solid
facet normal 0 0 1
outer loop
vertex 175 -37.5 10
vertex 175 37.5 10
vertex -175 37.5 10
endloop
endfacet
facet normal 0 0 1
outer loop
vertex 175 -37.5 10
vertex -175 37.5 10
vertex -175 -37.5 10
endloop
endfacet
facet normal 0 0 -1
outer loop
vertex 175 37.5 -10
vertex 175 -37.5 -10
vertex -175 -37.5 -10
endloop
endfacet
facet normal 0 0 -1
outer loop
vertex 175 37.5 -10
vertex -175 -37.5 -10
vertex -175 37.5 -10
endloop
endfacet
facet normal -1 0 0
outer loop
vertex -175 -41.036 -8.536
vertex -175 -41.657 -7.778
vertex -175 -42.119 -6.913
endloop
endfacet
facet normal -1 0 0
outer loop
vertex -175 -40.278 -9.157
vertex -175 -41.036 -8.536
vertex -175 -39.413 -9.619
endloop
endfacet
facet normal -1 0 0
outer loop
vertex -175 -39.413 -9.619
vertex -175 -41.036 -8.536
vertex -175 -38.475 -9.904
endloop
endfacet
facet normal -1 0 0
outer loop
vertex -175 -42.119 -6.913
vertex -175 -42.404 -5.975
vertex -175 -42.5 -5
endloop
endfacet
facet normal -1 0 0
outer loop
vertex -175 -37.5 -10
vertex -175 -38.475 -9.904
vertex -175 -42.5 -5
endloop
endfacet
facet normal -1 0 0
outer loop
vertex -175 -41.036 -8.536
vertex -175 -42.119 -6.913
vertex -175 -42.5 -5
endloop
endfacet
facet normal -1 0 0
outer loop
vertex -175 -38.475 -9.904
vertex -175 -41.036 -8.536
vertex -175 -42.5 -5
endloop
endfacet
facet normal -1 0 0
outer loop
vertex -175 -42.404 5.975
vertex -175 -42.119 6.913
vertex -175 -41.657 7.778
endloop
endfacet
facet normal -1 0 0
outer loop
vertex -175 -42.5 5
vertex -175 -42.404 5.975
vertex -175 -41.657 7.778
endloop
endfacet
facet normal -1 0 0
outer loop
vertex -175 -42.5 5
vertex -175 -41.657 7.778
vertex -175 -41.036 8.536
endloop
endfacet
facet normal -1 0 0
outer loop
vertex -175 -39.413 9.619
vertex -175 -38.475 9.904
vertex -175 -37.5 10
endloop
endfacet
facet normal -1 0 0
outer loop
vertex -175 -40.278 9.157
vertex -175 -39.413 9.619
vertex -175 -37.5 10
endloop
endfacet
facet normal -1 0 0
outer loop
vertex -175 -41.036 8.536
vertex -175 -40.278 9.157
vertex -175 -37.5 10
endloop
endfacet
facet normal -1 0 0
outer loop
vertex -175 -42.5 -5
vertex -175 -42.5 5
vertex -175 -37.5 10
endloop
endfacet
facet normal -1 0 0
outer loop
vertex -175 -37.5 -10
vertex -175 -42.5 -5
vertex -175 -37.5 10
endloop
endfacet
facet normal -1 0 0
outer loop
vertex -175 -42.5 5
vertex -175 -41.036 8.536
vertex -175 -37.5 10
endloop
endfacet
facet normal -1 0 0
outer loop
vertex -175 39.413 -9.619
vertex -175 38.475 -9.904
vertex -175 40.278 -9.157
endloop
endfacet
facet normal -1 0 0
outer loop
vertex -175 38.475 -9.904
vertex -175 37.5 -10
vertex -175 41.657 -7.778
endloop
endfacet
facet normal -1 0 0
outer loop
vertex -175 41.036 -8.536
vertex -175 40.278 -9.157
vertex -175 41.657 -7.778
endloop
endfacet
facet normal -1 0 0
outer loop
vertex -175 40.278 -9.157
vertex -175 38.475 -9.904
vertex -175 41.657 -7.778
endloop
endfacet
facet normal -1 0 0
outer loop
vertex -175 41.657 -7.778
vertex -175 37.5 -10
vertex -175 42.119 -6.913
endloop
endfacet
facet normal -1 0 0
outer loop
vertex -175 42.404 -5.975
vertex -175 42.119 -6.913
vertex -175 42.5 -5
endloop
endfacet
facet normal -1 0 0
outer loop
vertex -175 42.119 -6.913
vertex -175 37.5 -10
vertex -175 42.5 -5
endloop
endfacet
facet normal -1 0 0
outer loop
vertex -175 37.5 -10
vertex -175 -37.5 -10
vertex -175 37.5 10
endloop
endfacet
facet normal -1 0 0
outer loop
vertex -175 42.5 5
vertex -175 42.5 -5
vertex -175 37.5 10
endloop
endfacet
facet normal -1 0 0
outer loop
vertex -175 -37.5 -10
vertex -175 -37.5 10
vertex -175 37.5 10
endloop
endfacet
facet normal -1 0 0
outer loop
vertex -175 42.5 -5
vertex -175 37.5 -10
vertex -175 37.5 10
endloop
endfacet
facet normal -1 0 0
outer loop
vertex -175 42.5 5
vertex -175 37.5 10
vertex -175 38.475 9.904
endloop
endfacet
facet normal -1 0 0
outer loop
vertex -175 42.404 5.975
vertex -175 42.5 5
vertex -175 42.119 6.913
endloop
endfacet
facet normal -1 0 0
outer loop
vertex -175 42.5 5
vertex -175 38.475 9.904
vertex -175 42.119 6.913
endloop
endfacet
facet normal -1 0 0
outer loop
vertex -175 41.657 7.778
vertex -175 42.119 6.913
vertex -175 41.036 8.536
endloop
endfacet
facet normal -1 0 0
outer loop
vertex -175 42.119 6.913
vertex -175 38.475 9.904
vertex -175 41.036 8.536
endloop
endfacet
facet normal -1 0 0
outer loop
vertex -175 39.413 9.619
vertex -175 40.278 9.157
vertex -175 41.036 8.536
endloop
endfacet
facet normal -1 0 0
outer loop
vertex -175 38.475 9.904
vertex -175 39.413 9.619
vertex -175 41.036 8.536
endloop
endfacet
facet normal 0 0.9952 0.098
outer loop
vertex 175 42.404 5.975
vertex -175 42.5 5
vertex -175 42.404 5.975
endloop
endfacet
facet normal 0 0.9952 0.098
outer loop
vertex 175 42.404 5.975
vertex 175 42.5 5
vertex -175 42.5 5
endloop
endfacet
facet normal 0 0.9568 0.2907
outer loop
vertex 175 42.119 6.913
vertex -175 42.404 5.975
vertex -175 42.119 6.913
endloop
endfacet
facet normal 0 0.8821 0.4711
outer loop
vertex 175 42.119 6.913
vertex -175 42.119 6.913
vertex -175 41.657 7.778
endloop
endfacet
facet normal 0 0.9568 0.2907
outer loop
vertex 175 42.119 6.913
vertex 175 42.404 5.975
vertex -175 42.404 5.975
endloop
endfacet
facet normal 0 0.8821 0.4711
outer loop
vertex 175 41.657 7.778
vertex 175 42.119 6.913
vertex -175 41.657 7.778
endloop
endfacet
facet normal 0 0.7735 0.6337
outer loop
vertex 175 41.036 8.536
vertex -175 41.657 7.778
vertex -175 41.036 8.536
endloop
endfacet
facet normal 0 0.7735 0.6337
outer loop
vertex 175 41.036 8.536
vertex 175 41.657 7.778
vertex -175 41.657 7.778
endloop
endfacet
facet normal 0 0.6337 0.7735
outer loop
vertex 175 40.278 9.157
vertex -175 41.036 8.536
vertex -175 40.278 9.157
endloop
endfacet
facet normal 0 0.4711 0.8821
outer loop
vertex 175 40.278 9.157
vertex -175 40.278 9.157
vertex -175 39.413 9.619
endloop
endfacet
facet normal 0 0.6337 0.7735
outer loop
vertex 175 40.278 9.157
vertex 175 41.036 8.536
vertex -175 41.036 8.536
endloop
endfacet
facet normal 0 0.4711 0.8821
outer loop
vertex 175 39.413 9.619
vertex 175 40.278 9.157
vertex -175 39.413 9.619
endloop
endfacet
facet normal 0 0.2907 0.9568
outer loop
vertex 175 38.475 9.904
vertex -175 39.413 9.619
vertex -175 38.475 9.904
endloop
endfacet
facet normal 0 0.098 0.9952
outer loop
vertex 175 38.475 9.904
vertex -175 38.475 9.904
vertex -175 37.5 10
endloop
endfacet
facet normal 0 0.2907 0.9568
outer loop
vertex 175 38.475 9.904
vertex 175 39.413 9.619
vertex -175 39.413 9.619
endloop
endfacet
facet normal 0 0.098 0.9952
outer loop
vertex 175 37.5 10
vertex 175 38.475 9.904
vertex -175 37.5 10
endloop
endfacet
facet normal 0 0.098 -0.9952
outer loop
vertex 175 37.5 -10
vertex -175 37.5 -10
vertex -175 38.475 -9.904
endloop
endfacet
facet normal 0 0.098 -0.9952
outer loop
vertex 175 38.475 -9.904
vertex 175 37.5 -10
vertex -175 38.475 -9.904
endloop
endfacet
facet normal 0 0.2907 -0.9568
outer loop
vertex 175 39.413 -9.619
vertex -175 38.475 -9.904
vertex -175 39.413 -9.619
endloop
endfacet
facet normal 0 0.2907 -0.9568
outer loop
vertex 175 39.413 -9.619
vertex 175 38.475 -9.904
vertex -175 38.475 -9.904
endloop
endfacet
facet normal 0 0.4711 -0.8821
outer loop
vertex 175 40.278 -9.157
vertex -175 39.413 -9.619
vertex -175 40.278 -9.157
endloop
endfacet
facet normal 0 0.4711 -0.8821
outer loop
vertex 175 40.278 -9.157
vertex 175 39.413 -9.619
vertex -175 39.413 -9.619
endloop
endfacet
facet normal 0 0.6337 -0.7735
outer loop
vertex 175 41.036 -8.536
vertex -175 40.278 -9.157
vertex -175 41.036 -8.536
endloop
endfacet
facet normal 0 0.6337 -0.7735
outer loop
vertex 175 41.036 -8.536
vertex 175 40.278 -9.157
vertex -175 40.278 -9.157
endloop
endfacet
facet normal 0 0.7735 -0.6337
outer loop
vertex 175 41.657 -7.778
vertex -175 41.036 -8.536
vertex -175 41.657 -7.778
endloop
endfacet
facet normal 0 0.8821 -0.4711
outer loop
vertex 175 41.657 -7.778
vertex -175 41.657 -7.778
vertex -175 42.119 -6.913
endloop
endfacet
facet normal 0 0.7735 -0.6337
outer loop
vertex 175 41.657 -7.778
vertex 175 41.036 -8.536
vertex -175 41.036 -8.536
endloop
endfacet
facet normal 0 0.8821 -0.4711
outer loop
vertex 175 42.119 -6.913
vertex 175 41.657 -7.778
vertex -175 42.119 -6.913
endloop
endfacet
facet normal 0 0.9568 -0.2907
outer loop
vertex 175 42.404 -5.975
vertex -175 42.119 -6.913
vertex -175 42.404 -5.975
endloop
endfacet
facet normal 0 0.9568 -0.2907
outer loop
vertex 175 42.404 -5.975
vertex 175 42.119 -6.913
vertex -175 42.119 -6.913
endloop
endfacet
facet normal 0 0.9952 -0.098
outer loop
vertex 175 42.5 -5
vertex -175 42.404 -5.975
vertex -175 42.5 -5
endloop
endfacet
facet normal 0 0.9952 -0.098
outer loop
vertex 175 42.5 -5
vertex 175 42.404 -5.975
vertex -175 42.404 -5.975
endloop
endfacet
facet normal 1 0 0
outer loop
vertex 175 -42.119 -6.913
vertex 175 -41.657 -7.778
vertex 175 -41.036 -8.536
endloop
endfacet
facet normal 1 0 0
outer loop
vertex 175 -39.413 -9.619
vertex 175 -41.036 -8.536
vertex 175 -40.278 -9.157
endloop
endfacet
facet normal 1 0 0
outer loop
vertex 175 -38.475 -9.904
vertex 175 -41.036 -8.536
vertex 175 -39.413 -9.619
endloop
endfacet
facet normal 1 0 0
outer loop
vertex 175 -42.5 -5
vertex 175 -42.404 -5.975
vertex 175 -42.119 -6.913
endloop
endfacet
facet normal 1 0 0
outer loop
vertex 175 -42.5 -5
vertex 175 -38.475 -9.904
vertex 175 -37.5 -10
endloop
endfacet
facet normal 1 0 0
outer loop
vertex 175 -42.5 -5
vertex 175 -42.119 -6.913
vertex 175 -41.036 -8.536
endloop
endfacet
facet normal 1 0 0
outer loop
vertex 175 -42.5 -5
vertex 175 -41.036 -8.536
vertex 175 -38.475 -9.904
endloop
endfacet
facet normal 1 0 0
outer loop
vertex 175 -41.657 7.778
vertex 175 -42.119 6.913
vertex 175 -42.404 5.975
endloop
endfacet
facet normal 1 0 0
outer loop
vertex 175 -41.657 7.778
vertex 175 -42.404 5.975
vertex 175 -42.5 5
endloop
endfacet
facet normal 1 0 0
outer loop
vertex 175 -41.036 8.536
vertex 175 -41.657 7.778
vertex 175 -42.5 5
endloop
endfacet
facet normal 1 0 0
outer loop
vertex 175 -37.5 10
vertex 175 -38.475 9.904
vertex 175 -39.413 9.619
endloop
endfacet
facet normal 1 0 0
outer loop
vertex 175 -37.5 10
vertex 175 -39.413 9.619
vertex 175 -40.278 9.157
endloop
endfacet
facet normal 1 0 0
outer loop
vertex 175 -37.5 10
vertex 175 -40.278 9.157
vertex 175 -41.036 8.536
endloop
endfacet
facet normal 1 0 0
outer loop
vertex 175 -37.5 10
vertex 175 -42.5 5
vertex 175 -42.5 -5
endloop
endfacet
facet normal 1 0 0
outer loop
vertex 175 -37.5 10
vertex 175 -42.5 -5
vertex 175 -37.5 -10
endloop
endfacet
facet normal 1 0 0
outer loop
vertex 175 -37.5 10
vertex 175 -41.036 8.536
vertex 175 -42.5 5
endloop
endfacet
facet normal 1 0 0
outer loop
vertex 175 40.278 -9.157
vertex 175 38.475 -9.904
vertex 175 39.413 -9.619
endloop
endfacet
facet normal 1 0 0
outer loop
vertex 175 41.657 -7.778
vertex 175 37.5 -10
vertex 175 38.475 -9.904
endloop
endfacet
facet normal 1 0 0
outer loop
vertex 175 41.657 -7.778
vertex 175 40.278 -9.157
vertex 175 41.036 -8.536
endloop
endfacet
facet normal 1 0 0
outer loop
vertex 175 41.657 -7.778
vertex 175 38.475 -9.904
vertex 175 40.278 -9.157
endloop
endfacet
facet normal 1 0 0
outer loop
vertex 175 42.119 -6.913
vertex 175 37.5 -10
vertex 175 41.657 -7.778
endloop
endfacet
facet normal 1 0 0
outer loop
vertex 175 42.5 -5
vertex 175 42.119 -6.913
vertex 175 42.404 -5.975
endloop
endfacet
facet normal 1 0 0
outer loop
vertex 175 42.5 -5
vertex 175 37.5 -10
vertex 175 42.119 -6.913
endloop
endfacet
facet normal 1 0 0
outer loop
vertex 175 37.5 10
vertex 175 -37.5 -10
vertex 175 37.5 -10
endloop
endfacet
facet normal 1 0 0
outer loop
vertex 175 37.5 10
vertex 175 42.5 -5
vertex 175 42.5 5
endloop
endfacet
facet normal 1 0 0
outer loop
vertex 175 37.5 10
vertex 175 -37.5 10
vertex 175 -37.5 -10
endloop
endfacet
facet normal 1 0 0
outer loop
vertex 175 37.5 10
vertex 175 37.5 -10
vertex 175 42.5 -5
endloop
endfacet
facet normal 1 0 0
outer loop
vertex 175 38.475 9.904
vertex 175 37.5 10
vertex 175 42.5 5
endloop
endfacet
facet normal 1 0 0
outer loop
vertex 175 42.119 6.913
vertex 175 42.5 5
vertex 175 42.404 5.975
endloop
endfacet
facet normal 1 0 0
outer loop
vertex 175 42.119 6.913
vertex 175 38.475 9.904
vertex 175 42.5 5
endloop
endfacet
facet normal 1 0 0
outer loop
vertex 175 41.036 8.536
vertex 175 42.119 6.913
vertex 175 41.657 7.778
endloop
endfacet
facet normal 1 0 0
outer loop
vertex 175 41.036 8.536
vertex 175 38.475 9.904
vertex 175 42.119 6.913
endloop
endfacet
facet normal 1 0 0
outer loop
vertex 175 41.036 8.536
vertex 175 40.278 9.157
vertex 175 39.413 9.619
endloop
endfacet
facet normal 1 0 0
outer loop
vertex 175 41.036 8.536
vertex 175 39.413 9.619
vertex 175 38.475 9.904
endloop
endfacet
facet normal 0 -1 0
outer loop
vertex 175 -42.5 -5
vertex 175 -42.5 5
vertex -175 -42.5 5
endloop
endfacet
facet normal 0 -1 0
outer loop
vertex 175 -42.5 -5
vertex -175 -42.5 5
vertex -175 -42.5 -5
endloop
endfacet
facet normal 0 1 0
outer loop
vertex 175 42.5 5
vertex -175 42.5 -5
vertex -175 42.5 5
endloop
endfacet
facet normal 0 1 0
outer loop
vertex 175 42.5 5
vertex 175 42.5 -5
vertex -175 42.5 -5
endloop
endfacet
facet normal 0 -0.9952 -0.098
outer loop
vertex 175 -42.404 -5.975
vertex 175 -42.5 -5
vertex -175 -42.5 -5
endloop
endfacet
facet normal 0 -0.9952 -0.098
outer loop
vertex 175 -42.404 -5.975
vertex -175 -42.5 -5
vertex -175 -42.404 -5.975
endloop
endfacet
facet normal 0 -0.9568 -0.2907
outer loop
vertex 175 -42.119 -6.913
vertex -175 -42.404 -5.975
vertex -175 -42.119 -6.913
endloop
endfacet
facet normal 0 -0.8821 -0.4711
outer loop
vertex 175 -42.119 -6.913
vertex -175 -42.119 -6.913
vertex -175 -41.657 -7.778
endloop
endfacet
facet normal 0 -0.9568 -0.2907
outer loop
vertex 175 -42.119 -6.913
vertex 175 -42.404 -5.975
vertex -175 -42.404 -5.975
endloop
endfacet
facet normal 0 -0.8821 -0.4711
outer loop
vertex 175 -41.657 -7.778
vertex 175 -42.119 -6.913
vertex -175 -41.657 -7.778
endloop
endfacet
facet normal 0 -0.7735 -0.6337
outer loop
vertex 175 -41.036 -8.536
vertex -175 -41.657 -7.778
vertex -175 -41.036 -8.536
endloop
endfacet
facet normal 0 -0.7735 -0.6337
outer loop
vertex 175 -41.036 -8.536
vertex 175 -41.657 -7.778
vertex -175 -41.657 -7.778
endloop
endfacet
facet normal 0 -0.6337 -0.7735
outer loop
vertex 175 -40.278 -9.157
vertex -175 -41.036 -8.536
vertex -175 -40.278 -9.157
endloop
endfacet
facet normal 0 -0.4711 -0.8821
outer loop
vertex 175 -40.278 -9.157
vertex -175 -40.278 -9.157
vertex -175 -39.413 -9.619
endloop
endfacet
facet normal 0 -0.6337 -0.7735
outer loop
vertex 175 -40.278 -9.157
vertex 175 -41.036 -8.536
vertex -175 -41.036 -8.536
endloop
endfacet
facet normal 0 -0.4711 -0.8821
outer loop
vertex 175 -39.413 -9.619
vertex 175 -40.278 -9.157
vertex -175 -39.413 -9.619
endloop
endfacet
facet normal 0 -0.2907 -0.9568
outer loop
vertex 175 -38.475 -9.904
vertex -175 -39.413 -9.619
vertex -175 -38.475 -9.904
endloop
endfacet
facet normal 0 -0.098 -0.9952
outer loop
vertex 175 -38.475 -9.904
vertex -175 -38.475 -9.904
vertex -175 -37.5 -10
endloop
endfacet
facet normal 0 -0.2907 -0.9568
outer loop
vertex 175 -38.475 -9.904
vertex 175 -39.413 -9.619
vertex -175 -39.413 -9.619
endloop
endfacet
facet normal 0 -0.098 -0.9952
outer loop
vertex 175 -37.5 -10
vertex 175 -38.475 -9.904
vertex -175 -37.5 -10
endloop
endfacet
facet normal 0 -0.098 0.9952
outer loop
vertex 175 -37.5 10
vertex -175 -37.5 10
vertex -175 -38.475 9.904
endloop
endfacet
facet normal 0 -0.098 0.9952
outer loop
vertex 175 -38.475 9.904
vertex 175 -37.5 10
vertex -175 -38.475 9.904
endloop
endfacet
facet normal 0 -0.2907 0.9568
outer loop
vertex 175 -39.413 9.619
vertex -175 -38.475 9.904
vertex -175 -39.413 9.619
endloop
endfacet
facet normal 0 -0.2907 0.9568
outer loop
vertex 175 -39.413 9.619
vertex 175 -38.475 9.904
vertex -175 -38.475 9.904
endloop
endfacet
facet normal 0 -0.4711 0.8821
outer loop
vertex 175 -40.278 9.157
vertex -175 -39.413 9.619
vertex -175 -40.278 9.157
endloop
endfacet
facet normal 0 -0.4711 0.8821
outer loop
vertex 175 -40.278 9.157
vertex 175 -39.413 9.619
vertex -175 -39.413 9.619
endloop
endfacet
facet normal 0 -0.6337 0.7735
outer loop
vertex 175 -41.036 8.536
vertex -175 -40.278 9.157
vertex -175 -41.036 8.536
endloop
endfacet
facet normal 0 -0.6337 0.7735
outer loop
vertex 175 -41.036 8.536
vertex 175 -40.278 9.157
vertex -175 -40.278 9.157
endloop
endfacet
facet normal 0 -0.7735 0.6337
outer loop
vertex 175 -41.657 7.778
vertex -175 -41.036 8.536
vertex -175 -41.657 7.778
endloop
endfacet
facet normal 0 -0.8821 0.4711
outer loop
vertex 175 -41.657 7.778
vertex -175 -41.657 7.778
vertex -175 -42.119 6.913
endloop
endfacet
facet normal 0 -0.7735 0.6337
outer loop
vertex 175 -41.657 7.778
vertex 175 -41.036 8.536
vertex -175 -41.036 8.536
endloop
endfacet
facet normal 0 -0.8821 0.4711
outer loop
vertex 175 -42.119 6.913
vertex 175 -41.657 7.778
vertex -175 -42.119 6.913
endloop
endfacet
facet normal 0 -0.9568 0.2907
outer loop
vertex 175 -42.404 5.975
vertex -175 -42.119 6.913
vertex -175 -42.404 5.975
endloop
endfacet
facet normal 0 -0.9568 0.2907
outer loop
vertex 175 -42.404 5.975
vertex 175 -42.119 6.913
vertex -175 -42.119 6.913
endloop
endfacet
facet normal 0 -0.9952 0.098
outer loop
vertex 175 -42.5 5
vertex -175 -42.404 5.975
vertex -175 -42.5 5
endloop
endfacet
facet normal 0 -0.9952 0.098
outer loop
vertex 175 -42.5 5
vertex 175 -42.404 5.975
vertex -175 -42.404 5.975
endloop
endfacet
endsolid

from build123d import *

# Parameters (mm, degrees)
F1_DEPTH = 175


with BuildPart() as f1:
    # F0 (on Right) → F1 (new body, symmetric)
    with BuildSketch(Plane.YZ):
        with BuildLine():
            ThreePointArc((42.5, 5), (41.035534, 8.535534), (37.5, 10))
            Line((37.5, 10), (-37.5, 10))
            ThreePointArc((-37.5, 10), (-41.035534, 8.535534), (-42.5, 5))
            Line((-42.5, 5), (-42.5, -5))
            ThreePointArc((-42.5, -5), (-41.035534, -8.535534), (-37.5, -10))
            Line((-37.5, -10), (37.5, -10))
            ThreePointArc((37.5, -10), (41.035534, -8.535534), (42.5, -5))
            Line((42.5, -5), (42.5, 5))
        make_face()
    extrude(amount=F1_DEPTH, both=True)


solid = f1.part
